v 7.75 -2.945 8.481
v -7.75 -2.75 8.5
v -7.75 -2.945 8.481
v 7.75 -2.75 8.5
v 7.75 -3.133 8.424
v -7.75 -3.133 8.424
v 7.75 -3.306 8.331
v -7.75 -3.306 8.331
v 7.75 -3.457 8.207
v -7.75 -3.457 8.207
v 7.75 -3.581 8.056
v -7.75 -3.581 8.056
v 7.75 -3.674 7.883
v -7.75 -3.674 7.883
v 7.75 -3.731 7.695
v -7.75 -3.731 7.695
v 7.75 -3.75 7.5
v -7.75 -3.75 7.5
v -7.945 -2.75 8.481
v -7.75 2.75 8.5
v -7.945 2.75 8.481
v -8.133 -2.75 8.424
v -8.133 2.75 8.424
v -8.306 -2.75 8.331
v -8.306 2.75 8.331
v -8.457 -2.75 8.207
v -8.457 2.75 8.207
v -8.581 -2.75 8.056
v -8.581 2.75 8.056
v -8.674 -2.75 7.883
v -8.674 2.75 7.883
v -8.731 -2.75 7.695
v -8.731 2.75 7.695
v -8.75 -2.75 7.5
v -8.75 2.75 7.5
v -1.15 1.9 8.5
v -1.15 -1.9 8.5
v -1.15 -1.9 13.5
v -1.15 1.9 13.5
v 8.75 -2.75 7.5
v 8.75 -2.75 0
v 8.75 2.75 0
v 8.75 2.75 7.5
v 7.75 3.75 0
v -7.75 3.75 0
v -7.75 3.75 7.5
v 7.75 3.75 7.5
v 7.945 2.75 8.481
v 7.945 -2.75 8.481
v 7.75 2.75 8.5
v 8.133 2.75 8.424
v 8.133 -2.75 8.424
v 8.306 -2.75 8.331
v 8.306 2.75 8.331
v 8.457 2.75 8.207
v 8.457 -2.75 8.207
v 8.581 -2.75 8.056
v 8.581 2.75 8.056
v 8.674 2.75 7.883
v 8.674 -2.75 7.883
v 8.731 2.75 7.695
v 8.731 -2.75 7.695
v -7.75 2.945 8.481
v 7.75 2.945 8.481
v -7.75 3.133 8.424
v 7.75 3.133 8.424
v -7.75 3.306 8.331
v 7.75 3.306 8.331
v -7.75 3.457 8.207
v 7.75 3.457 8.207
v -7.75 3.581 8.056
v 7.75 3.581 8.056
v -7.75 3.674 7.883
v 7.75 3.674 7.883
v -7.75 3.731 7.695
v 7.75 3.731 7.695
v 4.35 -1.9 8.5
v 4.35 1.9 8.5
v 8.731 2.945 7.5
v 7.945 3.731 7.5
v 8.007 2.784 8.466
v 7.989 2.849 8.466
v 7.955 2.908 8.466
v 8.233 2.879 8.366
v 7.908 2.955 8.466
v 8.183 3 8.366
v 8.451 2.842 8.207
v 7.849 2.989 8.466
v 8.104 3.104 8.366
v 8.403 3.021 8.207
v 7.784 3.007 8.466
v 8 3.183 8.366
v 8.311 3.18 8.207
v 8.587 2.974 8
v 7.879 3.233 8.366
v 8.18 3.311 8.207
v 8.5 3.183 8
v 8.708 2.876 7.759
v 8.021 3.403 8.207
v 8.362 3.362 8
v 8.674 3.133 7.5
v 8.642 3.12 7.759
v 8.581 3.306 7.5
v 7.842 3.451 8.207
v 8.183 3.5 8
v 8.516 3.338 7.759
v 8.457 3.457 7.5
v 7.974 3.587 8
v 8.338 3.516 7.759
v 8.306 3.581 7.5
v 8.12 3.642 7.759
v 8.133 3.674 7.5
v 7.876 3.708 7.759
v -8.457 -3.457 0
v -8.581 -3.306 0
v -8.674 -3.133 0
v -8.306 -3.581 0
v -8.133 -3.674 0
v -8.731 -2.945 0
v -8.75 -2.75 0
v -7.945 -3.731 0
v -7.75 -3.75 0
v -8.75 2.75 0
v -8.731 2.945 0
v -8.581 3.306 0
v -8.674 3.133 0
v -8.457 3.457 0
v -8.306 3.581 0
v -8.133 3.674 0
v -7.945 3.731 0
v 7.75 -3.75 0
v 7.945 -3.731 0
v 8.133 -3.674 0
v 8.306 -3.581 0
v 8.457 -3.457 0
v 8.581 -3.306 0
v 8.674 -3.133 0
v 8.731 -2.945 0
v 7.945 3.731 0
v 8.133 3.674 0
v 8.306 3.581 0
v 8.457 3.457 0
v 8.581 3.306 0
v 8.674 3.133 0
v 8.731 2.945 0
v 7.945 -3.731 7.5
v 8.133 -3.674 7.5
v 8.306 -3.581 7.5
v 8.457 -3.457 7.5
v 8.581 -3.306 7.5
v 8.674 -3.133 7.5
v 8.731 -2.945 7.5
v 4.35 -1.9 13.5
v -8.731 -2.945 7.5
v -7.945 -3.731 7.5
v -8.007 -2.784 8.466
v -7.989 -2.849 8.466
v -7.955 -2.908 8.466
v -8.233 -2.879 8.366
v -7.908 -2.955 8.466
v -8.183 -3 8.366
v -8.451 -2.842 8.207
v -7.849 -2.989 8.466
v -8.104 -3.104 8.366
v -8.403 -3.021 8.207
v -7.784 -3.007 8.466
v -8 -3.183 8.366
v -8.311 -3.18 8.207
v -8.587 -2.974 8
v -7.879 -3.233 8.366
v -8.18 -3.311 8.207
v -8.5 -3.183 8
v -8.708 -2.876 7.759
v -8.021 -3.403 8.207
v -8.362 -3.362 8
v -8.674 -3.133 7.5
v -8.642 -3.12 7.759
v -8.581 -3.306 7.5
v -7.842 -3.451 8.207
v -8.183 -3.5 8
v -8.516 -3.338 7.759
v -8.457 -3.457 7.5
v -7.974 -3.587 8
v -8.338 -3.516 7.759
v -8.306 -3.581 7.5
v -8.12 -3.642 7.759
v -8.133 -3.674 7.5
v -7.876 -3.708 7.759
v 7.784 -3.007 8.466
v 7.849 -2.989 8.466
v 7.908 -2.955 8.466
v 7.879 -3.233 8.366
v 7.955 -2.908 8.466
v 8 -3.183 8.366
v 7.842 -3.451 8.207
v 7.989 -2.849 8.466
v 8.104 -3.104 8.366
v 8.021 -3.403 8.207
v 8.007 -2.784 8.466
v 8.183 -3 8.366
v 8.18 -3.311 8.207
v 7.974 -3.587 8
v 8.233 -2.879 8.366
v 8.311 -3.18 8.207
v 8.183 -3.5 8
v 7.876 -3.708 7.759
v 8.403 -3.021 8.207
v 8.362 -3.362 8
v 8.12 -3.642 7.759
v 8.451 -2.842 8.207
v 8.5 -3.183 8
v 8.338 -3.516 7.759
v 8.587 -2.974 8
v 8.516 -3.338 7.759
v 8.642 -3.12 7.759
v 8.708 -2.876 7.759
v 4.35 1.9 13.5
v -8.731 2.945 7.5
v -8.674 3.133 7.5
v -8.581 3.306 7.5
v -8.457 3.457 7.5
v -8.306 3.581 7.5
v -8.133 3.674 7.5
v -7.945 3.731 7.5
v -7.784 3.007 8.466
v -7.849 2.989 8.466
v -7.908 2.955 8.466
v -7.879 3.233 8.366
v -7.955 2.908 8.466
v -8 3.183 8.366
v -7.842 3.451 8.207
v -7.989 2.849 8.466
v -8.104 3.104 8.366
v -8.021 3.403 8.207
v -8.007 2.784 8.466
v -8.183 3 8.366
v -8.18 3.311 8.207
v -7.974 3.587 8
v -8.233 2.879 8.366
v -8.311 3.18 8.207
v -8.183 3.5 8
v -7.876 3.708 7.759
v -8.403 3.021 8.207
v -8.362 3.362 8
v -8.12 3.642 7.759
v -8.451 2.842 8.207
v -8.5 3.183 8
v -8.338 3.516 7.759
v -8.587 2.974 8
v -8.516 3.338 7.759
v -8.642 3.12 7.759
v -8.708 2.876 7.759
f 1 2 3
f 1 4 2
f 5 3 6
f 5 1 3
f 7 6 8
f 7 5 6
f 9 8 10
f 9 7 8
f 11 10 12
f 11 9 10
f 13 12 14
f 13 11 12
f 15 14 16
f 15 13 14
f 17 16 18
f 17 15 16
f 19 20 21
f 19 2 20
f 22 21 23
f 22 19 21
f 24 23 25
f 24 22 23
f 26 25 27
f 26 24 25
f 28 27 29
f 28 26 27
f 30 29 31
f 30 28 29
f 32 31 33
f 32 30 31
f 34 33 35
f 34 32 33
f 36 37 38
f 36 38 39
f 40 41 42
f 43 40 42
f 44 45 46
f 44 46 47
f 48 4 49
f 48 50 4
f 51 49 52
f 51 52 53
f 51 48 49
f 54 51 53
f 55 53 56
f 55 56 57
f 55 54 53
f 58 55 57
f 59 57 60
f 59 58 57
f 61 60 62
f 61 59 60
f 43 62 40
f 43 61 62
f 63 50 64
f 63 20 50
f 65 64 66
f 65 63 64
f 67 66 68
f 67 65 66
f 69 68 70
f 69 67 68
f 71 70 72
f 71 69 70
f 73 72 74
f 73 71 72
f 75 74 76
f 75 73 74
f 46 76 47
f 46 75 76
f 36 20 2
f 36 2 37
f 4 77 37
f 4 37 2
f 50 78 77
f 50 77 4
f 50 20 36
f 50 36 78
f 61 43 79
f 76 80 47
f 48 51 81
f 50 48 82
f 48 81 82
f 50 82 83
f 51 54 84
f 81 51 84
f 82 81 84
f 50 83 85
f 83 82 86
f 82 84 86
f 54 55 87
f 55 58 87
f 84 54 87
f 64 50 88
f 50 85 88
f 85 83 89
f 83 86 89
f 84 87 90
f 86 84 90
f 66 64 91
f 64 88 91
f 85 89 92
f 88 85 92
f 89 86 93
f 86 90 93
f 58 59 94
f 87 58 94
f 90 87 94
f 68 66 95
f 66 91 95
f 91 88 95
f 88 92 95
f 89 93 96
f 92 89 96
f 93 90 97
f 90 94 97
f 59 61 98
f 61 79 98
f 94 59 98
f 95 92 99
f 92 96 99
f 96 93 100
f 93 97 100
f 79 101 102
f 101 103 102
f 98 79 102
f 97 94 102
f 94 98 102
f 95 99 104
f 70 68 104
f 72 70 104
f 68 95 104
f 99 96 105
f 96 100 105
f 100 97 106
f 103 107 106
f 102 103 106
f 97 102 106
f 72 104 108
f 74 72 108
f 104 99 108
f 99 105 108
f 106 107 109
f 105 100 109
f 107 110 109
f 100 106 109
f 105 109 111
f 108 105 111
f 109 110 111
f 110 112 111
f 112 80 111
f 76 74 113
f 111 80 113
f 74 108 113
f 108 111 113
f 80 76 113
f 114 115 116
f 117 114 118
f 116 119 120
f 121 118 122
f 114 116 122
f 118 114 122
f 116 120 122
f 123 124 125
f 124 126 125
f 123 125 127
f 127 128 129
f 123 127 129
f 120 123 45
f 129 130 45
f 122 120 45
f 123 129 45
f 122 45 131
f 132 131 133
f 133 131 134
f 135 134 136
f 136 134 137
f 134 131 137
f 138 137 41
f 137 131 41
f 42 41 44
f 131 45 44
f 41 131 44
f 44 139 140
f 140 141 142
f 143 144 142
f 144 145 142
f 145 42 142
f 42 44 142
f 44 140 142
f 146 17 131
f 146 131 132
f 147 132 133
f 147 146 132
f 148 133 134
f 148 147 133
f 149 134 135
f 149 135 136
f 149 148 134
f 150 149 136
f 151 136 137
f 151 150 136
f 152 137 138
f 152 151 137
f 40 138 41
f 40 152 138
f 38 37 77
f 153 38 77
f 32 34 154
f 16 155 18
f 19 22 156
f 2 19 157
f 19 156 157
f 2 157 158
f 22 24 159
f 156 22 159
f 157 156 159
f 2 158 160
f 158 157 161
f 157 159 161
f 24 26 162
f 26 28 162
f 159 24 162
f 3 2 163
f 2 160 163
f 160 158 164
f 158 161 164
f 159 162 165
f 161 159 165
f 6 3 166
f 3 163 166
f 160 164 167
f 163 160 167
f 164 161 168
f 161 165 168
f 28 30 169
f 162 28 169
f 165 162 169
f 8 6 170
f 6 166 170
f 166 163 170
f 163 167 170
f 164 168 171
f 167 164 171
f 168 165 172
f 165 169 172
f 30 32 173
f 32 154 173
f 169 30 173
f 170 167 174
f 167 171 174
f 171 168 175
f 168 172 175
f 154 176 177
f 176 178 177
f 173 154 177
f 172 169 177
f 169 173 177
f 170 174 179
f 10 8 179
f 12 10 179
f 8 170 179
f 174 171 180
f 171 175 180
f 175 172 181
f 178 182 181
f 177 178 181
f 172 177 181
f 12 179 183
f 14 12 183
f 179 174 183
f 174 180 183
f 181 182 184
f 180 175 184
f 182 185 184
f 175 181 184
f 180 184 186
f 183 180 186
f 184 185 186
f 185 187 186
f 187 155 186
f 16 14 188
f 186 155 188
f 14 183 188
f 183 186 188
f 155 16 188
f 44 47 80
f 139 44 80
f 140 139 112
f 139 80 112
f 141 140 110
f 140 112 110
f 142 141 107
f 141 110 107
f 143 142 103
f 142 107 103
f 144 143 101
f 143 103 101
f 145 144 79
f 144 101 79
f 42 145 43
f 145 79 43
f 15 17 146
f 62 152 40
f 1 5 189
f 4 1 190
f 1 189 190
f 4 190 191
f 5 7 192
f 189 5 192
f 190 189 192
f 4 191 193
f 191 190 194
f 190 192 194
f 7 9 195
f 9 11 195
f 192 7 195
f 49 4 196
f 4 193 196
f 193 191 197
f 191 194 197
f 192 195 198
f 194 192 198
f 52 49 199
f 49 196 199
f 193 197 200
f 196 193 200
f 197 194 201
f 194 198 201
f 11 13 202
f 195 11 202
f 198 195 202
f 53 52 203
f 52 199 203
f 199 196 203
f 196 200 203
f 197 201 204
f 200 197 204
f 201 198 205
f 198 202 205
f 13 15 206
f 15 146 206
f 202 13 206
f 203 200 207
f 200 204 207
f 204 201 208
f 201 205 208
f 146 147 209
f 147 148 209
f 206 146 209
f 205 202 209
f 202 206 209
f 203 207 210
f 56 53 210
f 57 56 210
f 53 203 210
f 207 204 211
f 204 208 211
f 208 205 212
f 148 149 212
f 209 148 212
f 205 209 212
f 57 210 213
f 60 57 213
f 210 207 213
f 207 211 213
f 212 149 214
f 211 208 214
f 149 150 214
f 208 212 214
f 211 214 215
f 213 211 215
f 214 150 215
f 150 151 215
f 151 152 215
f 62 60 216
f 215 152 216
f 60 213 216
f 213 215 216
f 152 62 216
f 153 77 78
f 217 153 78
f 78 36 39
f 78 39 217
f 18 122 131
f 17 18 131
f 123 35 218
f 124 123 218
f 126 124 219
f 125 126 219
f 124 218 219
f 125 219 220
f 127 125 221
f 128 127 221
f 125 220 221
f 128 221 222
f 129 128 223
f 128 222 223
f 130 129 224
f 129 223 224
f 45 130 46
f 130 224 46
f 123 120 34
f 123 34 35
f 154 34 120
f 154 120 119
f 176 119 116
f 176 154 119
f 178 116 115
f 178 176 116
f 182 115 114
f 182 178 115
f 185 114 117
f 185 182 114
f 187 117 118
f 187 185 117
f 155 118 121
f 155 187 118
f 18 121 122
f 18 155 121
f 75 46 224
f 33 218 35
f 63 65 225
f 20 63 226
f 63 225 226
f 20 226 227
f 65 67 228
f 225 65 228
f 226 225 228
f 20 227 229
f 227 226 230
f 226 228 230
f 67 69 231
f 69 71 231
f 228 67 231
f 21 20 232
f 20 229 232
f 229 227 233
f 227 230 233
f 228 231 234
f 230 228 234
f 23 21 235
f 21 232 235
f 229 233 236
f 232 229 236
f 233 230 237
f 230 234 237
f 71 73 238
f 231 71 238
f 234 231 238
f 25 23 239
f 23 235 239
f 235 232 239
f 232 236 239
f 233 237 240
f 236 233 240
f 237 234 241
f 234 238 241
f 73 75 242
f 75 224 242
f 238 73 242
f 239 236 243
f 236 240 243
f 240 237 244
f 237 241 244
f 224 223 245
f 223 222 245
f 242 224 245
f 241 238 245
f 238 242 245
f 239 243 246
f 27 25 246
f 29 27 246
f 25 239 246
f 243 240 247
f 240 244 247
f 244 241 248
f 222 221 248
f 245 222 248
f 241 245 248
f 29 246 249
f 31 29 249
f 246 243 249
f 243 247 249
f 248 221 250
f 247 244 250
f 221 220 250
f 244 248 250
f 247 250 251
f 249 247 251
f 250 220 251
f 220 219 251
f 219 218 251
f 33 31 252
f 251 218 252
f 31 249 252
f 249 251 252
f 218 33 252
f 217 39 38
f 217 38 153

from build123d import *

# Parameters (mm, degrees)
SKETCH1_W           = 17.5
SKETCH1_H           = 7.5
BOSS_EXTRUDE1_DEPTH = 8.5
SKETCH2_W           = 5.5
SKETCH2_H           = 3.8
BOSS_EXTRUDE2_DEPTH = 5
FILLET1_R           = 1
FILLET2_R           = 1


with BuildPart() as part:
    # Sketch1 → Boss-Extrude1 (new body)
    with BuildSketch(Plane.XY):
        Rectangle(SKETCH1_W, SKETCH1_H)
    extrude(amount=BOSS_EXTRUDE1_DEPTH)

    # Sketch2 → Boss-Extrude2 (add)
    with BuildSketch(Plane.XY.offset(8.5)):
        with Locations((1.6, 0)):
            Rectangle(SKETCH2_W, SKETCH2_H)
    extrude(amount=BOSS_EXTRUDE2_DEPTH)

    # Fillet1
    fillet1_edges = [part.edges().sort_by_distance(p)[0] for p in [
        (8.75, -3.75, 4.25),
        (-8.75, -3.75, 4.25),
        (-8.75, 3.75, 4.25),
        (8.75, 3.75, 4.25),
    ]]
    fillet(fillet1_edges, radius=FILLET1_R)

    # Fillet2
    fillet2_edges = [part.edges().sort_by_distance(p)[0] for p in [
        (8.75, 0, 8.5),
        (0, -3.75, 8.5),
        (0, 3.75, 8.5),
        (-8.75, 0, 8.5),
        (-8.457106781, 3.457106781, 8.5),
        (-8.457106781, -3.457106781, 8.5),
        (8.457106781, 3.457106781, 8.5),
        (8.457106781, -3.457106781, 8.5),
    ]]
    fillet(fillet2_edges, radius=FILLET2_R)


solid = part.part
